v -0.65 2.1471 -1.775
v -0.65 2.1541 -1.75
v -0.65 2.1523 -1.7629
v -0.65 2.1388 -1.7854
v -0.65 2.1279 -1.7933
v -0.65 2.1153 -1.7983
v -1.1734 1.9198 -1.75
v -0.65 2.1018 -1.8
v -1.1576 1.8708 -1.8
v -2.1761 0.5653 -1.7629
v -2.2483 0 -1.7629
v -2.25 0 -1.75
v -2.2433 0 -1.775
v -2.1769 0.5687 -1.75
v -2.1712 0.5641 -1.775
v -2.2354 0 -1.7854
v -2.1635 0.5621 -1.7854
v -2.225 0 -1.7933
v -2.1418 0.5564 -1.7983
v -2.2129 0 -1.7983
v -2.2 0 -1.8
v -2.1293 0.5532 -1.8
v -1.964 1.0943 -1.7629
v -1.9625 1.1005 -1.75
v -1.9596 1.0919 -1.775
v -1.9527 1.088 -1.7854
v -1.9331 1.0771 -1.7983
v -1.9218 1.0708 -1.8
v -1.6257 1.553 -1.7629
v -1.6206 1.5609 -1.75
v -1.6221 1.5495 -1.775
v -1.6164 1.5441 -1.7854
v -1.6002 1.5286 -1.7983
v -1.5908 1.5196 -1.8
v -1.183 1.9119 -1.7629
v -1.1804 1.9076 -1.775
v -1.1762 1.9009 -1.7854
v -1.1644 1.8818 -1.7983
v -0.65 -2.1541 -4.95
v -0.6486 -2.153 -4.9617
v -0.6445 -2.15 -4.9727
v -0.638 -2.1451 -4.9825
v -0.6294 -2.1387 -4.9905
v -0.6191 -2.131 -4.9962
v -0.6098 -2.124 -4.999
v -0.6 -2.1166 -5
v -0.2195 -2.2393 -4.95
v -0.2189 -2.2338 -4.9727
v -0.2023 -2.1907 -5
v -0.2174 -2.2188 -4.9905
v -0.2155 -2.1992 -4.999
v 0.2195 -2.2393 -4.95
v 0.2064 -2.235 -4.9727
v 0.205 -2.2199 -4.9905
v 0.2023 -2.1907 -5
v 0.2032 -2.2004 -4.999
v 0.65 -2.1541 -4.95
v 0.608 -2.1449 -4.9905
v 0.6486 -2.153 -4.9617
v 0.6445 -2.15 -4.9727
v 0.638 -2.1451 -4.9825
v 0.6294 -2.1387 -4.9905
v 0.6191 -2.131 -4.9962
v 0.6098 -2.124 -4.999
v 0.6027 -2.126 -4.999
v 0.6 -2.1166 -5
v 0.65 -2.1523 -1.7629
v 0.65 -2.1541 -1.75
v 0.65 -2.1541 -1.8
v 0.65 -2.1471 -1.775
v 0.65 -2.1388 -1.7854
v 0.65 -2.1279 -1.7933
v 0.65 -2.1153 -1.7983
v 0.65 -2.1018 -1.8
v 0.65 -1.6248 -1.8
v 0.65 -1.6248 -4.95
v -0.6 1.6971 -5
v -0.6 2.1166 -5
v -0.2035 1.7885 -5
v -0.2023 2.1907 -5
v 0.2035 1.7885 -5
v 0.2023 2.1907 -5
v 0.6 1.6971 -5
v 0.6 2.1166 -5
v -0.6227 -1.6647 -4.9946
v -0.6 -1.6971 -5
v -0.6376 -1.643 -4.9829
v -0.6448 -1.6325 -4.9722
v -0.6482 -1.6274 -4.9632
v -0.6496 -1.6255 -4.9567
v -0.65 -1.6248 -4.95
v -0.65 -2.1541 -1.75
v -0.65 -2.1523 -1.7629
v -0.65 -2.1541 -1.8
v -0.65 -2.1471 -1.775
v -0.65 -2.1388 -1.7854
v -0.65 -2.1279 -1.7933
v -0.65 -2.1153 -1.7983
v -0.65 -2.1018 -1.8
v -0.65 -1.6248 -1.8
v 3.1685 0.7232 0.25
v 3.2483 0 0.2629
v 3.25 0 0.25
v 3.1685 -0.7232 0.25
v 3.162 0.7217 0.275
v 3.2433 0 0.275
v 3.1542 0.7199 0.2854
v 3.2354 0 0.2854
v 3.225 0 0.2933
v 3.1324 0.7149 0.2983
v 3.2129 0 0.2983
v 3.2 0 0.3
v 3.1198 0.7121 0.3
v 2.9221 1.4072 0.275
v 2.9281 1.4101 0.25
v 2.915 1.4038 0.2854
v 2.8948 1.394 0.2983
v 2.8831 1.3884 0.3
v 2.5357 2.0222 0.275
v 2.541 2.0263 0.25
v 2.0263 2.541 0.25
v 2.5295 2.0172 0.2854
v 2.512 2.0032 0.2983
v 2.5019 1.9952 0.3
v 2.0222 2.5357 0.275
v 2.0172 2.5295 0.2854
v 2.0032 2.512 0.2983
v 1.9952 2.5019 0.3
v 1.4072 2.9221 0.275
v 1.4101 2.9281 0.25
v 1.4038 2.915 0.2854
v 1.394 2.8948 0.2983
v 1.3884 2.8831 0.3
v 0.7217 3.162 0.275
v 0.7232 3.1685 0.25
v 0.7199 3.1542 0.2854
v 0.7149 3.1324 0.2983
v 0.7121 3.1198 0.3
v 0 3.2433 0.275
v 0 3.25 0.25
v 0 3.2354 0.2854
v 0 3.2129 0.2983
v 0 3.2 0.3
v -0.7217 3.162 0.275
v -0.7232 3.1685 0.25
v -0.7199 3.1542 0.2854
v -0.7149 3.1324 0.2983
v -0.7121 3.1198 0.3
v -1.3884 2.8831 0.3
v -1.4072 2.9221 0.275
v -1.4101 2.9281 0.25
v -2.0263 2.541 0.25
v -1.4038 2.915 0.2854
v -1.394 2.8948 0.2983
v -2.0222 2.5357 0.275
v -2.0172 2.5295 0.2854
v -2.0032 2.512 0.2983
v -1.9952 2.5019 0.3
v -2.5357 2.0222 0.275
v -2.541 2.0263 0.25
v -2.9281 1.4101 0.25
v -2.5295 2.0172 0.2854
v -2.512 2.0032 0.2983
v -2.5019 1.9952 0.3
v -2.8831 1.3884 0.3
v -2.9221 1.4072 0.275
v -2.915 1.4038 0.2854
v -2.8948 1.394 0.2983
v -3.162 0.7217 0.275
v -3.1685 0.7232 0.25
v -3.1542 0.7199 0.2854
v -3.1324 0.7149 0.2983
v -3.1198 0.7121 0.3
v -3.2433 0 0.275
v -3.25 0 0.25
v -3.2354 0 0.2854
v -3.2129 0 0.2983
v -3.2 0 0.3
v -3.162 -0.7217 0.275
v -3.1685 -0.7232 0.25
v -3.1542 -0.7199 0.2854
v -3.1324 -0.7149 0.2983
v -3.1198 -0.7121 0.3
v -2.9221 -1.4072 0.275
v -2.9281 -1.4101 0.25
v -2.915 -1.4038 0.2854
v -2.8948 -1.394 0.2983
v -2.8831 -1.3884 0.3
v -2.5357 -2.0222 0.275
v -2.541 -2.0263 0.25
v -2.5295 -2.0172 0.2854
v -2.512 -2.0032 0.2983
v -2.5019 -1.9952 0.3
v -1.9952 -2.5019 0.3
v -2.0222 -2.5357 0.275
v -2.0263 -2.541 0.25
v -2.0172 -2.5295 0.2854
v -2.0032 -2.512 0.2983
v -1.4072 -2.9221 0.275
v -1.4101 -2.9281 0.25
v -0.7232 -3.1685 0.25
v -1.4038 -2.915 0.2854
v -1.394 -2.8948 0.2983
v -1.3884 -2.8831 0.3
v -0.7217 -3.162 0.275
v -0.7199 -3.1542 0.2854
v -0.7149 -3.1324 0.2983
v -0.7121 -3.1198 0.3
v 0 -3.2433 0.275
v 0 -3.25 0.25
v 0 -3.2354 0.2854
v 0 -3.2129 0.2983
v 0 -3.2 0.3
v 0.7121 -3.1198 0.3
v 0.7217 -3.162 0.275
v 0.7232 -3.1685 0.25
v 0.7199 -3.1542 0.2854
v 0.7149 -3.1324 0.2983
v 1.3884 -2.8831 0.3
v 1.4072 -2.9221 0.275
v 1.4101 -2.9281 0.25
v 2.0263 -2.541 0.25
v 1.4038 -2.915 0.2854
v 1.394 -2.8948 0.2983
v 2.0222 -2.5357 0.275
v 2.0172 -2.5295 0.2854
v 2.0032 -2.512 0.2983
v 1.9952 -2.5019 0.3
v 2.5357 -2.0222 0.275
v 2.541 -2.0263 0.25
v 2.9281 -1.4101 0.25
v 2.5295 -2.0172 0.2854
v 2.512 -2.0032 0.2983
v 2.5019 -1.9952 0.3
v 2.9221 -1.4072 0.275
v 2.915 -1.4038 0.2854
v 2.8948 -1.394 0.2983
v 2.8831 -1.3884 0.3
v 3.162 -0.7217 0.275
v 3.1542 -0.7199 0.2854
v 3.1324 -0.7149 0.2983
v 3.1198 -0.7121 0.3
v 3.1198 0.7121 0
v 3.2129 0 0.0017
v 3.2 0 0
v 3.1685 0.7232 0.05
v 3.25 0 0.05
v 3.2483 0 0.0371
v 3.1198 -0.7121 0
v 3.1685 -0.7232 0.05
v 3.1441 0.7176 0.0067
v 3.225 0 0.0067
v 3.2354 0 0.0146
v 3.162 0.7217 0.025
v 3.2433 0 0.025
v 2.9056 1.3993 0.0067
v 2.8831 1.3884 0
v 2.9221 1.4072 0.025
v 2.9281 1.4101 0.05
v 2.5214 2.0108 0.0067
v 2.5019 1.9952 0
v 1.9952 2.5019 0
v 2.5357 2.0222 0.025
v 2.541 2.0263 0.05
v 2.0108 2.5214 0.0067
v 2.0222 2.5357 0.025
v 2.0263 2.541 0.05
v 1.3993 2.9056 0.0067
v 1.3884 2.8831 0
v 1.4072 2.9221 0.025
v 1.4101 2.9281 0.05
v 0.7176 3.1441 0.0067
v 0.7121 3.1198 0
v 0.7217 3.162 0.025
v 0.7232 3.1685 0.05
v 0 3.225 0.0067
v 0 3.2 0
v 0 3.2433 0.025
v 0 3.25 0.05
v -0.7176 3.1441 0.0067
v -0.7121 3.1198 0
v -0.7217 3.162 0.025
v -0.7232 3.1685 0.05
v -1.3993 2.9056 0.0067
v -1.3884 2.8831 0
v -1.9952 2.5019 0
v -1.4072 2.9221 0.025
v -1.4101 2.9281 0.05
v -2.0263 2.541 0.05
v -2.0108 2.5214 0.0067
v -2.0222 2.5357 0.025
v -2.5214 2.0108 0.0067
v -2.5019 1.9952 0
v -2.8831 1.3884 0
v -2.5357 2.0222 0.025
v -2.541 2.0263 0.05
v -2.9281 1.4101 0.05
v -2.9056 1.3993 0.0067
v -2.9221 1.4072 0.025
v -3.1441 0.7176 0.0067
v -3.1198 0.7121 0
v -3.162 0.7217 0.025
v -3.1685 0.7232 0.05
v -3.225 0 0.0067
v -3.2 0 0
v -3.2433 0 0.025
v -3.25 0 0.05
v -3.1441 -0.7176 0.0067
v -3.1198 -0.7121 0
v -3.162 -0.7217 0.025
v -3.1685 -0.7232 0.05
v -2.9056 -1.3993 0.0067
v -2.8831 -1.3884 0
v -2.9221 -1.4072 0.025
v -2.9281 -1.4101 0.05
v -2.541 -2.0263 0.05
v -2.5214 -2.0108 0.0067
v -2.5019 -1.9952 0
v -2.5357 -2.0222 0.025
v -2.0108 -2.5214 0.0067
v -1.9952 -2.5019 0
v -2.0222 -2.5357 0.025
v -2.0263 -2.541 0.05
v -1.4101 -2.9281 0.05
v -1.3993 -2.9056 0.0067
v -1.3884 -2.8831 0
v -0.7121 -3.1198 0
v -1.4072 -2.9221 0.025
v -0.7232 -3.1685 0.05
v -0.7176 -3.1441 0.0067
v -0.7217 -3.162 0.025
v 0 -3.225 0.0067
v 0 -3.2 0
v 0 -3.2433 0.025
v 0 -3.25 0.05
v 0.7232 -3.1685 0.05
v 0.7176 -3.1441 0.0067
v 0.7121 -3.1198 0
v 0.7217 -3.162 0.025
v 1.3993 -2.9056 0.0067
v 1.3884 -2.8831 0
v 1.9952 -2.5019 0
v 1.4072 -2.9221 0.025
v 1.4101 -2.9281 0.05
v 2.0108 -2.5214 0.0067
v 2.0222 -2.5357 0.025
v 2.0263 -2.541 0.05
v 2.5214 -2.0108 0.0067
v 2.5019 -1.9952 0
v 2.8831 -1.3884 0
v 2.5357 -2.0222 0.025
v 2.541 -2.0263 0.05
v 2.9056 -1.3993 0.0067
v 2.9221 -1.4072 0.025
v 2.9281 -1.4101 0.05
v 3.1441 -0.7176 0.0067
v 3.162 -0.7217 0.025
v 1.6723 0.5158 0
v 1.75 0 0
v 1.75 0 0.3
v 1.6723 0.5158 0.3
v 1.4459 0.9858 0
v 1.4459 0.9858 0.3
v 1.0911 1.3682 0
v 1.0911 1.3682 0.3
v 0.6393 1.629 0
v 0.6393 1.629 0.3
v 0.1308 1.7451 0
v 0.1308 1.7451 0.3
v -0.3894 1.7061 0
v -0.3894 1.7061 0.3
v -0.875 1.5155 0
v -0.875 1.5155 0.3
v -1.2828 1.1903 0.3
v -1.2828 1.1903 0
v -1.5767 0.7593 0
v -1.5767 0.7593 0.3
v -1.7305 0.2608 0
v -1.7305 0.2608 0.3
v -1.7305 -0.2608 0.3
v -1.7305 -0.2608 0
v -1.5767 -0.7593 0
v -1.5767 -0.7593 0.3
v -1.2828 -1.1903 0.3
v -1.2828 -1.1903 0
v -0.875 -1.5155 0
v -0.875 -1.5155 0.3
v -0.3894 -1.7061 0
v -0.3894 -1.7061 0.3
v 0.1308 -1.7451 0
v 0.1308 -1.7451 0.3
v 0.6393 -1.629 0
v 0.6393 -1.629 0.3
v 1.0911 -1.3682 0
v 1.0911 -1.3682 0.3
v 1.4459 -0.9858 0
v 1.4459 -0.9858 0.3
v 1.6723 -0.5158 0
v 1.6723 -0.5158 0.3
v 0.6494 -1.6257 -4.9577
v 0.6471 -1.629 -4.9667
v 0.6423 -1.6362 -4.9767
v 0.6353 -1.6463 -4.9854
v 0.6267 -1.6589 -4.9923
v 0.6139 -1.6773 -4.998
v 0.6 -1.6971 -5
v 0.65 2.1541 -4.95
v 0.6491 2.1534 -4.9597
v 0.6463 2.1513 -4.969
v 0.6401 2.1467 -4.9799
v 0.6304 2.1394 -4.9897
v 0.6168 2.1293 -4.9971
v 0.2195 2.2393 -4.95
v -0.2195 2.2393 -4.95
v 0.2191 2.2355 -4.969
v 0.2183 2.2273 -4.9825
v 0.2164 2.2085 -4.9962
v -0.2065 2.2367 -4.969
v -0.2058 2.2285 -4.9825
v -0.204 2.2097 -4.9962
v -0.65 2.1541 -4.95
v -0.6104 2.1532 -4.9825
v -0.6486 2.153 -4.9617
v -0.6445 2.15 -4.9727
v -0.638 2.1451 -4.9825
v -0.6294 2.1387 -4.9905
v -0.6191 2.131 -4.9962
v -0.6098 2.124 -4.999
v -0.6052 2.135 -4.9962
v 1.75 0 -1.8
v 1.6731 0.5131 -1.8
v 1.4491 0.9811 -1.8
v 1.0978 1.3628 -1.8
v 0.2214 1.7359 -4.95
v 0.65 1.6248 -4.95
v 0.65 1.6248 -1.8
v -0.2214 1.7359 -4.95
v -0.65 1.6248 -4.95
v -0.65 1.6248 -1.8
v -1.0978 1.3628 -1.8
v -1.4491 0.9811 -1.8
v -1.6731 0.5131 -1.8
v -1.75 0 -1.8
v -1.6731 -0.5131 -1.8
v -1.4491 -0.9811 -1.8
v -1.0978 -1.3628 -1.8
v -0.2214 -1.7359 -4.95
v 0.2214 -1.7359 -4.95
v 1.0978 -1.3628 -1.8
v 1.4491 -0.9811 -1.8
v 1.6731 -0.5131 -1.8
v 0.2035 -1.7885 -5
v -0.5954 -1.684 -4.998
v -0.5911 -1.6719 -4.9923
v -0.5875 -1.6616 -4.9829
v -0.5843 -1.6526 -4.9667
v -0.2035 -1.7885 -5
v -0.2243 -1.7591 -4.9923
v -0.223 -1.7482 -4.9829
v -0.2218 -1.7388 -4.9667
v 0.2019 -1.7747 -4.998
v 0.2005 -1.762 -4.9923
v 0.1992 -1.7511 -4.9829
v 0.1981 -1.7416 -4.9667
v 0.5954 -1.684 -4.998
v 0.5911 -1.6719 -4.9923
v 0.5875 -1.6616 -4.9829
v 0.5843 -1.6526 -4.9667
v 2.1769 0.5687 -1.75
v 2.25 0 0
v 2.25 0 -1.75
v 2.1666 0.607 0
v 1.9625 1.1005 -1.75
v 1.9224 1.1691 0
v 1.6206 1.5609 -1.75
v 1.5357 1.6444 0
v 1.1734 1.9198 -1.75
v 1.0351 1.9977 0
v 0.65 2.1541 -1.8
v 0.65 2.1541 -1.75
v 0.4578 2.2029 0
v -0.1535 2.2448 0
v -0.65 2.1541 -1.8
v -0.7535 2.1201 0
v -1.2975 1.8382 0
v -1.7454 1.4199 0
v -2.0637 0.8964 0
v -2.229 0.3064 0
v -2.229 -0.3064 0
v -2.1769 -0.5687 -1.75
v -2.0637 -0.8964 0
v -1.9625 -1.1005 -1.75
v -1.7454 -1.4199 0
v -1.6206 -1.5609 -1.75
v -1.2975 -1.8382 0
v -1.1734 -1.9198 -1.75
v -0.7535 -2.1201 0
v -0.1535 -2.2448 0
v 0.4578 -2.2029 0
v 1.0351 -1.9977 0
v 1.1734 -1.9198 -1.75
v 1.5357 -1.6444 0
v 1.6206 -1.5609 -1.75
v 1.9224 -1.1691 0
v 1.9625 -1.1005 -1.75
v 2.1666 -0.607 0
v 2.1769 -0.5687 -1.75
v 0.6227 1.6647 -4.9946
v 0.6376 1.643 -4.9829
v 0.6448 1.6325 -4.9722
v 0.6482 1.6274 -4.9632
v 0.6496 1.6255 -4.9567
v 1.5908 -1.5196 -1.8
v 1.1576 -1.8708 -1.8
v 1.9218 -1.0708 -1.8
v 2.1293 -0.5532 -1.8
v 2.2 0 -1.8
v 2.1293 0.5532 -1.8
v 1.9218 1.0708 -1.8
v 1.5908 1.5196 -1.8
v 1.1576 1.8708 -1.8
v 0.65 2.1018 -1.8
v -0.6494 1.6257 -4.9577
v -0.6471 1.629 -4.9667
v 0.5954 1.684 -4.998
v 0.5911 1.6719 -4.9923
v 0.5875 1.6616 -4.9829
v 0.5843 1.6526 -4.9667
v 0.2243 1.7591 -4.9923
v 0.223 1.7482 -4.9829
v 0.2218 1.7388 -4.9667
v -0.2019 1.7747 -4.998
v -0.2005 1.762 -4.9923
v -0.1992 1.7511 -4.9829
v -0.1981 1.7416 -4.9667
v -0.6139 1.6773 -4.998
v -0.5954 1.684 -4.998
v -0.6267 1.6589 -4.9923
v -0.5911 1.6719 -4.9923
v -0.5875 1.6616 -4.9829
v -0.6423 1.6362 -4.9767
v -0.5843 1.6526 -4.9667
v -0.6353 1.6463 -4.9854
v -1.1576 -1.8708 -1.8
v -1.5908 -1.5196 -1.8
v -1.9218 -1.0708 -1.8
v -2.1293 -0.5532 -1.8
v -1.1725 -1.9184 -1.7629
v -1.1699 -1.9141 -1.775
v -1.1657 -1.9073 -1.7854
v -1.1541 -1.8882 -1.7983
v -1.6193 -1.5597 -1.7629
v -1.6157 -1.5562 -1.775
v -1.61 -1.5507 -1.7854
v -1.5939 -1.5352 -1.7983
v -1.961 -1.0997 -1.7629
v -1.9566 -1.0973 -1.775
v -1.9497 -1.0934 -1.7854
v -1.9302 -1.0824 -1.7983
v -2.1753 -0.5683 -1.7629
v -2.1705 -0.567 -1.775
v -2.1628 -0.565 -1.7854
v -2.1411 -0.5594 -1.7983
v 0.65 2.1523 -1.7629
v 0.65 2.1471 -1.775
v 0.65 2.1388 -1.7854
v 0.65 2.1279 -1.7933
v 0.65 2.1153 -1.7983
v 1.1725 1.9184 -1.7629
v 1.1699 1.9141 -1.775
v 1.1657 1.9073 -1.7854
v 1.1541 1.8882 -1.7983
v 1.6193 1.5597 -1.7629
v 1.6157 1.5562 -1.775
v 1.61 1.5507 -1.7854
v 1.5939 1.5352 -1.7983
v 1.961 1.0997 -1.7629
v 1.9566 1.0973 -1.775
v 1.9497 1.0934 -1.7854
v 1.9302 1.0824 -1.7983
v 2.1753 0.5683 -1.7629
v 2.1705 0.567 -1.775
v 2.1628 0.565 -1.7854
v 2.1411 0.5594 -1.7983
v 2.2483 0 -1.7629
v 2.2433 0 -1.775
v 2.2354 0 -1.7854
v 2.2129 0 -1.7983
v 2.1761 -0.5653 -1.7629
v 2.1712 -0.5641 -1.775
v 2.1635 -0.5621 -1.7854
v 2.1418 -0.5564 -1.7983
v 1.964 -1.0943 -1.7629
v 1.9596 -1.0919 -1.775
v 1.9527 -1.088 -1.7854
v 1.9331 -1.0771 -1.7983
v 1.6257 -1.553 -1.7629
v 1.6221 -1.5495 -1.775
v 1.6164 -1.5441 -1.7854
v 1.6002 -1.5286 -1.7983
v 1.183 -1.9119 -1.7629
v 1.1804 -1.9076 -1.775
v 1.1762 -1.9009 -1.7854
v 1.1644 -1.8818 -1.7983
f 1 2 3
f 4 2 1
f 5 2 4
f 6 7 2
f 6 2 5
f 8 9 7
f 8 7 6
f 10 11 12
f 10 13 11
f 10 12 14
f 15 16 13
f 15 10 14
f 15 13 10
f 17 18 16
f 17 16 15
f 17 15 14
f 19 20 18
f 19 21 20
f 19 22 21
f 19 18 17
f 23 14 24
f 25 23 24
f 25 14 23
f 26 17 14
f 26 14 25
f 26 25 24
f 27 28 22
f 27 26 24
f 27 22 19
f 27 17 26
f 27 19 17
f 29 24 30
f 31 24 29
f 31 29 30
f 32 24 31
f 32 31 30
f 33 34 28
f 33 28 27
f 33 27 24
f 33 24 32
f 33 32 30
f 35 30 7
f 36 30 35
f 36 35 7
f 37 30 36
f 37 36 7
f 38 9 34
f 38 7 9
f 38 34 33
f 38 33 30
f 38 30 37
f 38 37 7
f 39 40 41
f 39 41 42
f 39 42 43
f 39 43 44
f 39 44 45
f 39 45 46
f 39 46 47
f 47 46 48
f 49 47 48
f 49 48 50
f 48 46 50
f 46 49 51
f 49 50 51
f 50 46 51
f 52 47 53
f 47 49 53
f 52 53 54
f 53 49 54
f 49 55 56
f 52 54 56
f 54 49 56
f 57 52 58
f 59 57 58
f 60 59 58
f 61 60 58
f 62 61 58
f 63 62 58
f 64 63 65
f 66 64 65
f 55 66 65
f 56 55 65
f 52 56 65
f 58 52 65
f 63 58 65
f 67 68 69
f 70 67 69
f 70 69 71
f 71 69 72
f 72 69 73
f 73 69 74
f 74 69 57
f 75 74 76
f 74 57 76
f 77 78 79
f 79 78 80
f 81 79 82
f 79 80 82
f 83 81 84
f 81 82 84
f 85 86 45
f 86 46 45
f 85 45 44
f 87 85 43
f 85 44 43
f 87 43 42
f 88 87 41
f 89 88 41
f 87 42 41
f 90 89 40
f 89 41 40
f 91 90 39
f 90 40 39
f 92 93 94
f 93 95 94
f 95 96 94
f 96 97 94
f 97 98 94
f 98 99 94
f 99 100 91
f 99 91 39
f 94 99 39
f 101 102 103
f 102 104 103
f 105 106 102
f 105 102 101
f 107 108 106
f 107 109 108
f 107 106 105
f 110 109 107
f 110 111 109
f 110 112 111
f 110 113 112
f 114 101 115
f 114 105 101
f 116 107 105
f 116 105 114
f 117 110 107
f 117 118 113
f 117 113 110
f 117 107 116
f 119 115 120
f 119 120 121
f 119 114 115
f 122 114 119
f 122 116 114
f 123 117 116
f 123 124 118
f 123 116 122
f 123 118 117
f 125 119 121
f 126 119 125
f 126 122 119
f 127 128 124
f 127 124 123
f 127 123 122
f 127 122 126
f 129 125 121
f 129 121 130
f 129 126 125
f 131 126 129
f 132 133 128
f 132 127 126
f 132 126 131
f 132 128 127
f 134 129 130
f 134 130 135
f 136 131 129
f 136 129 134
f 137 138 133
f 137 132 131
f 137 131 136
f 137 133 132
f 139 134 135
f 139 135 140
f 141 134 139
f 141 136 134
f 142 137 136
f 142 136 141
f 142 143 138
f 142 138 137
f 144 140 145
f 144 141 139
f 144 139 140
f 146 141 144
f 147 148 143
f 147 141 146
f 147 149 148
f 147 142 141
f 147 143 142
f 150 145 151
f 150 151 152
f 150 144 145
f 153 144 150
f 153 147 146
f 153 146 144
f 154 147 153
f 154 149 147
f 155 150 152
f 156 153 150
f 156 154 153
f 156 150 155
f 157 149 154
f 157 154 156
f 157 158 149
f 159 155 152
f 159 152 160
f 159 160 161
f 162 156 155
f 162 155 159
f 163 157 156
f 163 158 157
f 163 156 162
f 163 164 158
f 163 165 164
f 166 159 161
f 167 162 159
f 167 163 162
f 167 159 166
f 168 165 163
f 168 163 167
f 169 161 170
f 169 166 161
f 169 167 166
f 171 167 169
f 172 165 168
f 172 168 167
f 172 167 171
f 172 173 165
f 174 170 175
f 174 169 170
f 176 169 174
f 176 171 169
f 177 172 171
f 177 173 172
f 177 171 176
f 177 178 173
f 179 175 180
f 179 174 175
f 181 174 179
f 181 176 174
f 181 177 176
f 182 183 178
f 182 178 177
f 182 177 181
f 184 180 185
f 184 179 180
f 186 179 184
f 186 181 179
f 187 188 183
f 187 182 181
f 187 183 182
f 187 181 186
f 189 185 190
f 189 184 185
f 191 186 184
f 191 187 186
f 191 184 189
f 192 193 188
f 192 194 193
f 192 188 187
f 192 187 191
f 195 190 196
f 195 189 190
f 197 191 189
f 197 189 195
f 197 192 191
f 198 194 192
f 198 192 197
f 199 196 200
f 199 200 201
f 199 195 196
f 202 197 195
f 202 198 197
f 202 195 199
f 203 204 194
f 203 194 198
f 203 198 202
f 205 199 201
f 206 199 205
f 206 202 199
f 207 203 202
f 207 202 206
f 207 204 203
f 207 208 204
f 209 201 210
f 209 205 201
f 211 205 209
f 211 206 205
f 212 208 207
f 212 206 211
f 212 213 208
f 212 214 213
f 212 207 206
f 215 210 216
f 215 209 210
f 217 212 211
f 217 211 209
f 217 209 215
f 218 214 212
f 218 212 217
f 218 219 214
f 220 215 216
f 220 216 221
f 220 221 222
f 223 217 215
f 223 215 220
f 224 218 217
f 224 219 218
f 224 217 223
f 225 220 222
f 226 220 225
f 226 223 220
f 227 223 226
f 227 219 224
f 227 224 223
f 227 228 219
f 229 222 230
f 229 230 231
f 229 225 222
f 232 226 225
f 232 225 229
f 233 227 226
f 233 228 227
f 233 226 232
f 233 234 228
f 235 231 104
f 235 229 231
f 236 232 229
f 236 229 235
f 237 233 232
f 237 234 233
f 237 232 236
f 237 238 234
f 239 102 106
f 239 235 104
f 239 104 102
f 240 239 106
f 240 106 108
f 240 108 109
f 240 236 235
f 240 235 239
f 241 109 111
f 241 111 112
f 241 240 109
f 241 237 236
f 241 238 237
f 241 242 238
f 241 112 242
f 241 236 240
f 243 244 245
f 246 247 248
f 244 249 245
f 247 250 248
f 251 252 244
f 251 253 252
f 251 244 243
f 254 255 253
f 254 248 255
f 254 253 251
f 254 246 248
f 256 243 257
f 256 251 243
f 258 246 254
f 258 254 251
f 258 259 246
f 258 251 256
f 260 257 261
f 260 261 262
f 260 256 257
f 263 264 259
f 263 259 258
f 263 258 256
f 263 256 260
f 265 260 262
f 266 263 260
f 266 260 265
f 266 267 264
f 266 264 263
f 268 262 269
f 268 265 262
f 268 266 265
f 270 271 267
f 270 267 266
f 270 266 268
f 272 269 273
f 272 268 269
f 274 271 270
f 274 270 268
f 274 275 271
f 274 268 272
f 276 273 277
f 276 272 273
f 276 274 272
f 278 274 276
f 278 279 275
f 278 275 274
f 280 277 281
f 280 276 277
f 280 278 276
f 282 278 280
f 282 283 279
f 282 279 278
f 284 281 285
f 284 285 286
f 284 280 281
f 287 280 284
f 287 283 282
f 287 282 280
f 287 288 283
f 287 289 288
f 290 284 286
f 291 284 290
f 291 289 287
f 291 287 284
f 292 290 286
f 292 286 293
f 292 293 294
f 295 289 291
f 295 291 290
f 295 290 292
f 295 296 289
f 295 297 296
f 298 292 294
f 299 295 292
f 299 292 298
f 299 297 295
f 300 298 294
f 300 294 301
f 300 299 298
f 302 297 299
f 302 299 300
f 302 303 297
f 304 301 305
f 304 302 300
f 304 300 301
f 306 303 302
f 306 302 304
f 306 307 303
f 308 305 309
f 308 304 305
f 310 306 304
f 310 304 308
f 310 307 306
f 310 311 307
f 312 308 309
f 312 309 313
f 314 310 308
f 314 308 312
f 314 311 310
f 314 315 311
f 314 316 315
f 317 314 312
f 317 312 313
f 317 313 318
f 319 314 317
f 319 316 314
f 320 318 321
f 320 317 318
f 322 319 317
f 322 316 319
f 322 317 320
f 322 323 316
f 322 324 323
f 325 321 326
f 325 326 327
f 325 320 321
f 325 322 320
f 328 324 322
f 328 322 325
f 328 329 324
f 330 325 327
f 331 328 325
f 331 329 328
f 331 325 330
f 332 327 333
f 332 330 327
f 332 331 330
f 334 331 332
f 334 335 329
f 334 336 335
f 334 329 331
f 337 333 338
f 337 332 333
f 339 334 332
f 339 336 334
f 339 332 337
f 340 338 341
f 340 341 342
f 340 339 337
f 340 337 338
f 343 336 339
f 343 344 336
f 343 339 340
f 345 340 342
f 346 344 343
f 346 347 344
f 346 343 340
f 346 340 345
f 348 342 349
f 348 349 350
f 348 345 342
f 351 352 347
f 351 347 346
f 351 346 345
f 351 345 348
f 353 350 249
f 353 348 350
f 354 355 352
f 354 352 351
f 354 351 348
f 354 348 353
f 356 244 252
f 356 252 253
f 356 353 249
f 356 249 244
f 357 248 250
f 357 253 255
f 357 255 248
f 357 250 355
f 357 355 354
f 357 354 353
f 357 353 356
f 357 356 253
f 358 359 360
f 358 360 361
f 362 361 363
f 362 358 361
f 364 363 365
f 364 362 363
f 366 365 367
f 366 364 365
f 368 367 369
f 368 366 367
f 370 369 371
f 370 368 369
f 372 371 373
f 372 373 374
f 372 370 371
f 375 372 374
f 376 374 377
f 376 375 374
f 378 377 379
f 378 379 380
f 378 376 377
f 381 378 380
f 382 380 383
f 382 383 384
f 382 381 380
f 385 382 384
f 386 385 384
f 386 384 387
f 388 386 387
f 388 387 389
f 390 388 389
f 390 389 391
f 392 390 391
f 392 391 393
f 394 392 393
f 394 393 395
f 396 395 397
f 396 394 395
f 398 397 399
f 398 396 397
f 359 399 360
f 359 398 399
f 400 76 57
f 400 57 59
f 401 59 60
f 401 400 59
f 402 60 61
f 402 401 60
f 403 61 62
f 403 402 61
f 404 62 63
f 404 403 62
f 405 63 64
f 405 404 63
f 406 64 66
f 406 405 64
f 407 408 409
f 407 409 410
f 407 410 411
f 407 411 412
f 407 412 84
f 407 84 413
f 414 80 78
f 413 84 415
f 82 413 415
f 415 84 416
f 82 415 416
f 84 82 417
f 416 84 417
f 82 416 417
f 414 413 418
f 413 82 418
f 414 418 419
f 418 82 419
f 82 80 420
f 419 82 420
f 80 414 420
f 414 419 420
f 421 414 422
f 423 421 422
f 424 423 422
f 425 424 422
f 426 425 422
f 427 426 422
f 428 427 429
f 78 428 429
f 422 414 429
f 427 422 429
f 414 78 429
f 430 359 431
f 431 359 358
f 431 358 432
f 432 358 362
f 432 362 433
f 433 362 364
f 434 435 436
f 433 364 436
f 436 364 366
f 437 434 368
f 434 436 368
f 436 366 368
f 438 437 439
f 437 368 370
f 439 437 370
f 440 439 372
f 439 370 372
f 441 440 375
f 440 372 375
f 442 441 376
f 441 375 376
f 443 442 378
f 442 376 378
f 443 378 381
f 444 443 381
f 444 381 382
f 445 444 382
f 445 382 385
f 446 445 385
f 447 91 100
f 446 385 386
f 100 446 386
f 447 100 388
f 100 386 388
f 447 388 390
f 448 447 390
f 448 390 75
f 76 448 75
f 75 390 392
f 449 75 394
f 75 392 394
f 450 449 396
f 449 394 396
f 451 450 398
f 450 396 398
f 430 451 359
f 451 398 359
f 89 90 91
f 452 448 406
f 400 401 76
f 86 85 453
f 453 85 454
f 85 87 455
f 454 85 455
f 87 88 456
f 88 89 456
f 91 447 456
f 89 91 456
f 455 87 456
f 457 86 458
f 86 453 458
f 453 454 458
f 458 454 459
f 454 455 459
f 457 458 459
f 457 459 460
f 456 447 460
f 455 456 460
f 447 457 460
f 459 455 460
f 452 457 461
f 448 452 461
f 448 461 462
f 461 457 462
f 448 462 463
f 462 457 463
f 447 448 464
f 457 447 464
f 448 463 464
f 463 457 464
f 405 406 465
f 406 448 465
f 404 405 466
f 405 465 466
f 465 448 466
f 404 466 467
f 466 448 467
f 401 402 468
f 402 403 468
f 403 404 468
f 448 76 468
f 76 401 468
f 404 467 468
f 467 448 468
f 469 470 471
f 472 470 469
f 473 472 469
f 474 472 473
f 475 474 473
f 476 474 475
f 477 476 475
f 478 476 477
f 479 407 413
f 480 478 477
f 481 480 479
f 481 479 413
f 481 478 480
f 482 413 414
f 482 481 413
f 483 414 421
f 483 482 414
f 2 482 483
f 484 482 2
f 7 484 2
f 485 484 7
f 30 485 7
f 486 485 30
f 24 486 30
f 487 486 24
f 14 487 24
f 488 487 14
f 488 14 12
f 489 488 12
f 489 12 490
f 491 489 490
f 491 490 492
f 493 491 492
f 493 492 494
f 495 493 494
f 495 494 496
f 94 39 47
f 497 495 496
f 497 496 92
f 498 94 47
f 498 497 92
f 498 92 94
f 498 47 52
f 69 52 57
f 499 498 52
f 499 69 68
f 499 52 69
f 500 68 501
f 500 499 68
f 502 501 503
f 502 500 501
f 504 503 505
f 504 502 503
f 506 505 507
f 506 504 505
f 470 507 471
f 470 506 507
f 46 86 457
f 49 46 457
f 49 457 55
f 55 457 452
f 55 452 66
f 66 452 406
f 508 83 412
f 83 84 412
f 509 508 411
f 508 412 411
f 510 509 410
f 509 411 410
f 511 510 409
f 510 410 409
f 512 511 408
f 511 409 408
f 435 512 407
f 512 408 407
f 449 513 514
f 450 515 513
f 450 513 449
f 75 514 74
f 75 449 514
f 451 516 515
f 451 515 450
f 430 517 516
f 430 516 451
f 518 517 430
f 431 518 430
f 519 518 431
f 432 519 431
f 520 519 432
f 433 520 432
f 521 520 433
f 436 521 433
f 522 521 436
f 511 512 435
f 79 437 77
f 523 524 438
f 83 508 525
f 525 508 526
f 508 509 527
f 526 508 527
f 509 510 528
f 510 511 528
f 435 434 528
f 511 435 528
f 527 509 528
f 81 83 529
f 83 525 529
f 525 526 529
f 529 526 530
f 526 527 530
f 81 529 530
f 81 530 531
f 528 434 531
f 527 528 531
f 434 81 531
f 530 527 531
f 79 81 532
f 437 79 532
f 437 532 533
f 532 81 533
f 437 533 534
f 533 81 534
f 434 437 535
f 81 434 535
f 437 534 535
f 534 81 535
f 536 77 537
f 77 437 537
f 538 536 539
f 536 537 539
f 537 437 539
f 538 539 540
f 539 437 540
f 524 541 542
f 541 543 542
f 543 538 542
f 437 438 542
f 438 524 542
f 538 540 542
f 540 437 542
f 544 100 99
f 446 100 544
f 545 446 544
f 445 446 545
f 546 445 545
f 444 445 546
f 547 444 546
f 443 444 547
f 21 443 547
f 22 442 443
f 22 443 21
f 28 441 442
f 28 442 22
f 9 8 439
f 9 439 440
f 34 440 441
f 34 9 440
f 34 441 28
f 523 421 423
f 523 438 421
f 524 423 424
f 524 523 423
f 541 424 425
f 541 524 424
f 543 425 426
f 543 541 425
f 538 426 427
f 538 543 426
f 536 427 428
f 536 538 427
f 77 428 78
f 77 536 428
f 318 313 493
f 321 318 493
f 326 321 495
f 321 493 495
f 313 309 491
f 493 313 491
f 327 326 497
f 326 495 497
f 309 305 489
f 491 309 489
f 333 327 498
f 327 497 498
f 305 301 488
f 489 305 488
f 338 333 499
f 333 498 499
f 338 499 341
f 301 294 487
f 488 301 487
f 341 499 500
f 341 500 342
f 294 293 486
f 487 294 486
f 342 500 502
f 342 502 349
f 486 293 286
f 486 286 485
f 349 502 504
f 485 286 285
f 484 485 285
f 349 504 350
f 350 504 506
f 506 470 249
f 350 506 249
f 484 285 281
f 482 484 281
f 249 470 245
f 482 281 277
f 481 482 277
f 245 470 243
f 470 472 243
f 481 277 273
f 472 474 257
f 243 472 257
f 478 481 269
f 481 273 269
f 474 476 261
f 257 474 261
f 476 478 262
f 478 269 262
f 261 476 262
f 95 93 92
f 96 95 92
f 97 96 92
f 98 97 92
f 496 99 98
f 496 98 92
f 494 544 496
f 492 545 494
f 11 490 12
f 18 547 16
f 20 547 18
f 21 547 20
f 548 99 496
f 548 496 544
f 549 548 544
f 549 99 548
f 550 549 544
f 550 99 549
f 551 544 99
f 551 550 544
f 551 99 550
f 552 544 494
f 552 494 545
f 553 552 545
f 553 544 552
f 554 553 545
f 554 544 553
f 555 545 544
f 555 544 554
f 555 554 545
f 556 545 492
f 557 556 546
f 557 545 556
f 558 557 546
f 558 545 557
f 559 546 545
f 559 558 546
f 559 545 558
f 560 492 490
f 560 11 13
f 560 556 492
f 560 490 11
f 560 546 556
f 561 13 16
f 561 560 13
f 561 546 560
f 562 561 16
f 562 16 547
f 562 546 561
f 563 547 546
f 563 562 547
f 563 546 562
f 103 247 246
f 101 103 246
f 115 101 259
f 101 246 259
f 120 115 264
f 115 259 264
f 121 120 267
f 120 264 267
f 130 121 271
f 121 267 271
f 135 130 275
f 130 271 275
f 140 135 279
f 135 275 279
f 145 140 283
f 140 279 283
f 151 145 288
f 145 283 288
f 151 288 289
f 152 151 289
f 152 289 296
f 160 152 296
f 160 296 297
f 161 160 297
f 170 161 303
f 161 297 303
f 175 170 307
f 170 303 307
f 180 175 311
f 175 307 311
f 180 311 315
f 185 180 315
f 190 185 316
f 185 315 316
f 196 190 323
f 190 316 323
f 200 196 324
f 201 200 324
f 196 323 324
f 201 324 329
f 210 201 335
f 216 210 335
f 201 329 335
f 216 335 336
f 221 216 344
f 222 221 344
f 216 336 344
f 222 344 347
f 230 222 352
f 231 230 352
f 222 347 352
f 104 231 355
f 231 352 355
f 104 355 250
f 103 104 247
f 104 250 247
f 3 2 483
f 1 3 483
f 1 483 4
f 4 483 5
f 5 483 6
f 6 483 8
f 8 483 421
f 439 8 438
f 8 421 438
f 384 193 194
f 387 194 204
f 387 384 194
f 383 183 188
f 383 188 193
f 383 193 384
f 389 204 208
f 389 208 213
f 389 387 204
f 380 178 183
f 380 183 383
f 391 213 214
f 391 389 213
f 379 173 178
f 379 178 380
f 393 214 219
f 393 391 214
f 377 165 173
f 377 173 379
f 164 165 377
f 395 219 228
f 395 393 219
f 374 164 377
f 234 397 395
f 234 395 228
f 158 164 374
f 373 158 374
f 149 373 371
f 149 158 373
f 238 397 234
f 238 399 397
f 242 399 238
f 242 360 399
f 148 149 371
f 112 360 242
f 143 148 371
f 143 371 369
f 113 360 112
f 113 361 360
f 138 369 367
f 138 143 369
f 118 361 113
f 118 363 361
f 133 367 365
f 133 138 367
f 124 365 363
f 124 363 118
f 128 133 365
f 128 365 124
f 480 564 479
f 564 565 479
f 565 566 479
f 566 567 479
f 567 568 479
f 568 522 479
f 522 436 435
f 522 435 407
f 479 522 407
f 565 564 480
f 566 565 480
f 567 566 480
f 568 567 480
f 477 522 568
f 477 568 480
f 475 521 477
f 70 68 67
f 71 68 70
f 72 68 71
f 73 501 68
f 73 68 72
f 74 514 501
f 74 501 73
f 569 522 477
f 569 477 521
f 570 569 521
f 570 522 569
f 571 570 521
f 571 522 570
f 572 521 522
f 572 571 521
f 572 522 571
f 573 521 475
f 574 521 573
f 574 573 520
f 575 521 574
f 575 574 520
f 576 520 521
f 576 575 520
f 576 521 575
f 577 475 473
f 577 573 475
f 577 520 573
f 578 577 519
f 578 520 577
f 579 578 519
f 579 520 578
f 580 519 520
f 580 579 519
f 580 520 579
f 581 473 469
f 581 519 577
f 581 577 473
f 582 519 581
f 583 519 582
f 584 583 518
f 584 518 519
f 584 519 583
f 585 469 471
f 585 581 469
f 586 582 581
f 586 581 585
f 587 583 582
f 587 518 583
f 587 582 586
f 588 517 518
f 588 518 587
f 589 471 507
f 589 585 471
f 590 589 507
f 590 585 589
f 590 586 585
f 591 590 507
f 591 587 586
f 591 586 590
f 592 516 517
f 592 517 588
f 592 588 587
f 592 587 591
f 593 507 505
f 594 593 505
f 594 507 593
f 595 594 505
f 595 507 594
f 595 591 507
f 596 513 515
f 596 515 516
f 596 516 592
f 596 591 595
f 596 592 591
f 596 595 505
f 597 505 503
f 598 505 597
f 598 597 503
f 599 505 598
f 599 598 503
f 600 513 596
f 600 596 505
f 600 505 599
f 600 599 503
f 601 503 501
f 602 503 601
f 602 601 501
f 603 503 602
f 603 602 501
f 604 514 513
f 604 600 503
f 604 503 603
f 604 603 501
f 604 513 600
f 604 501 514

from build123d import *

# Parameters (mm, degrees)
SKETCH_1_R          = 3.25
SKETCH_1_R_2        = 2.25
SKETCH_1_R_3        = 1.75
EXTRUDE_1_DEPTH     = 0.3
SKETCH_1_4_R        = 2.25
SKETCH_1_4_R_2      = 1.75
EXTRUDE_2_DEPTH     = 5
CUT_EXTRUDE_1_DEPTH = 3.2
FILLET_1_R          = 0.05


with BuildPart() as part:
    # Sketch 1 → Extrude 1 (new body)
    with BuildSketch(Plane.XY):
        Circle(SKETCH_1_R)
        Circle(SKETCH_1_R_2, mode=Mode.SUBTRACT)
        Circle(SKETCH_1_R_2)
        Circle(SKETCH_1_R_3, mode=Mode.SUBTRACT)
    extrude(amount=EXTRUDE_1_DEPTH)

    # Sketch 1_4 → Extrude 2 (add)
    with BuildSketch(Plane.XY):
        Circle(SKETCH_1_4_R)
        Circle(SKETCH_1_4_R_2, mode=Mode.SUBTRACT)
    extrude(amount=-EXTRUDE_2_DEPTH)

    # Sketch 2 → Cut-Extrude 1 (cut)
    with BuildSketch(Plane(origin=(0, 0, -5), x_dir=(-1, 0, 0), z_dir=(0, 0, -1))):
        with BuildLine():
            ThreePointArc((-0.65, 2.154065923), (-2.25, 0), (-0.65, -2.154065923))
            Line((-0.65, -2.154065923), (-0.65, -1.624807681))
            ThreePointArc((-0.65, -1.624807681), (-1.75, 0), (-0.65, 1.624807681))
            Line((-0.65, 1.624807681), (-0.65, 2.154065923))
        make_face()
        with BuildLine():
            Line((0.65, -1.624807681), (0.65, -2.154065923))
            ThreePointArc((0.65, -2.154065923), (1.806239187, -1.341640786), (2.25, 0))
            ThreePointArc((2.25, 0), (1.806239187, 1.341640786), (0.65, 2.154065923))
            Line((0.65, 2.154065923), (0.65, 1.624807681))
            ThreePointArc((0.65, 1.624807681), (1.449137675, 0.981070844), (1.75, 0))
            ThreePointArc((1.75, 0), (1.449137675, -0.981070844), (0.65, -1.624807681))
        make_face()
    extrude(amount=-CUT_EXTRUDE_1_DEPTH, mode=Mode.SUBTRACT)

    # Fillet 1
    fillet_1_edges = [part.edges().sort_by_distance(p)[0] for p in [
        (1.806239187, 1.341640786, -1.8),
        (0.65, -1.889436802, -5),
        (0.65, 1.889436802, -5),
        (0, -2.25, -5),
        (0, -1.75, -5),
        (-0.65, -1.889436802, -5),
        (-0.65, 1.889436802, -5),
        (-2.25, 0, -1.8),
        (-3.25, 0, 0),
        (-3.25, 0, 0.3),
        (0, 2.25, -5),
        (0, 1.75, -5),
    ]]
    fillet(fillet_1_edges, radius=FILLET_1_R)


solid = part.part
